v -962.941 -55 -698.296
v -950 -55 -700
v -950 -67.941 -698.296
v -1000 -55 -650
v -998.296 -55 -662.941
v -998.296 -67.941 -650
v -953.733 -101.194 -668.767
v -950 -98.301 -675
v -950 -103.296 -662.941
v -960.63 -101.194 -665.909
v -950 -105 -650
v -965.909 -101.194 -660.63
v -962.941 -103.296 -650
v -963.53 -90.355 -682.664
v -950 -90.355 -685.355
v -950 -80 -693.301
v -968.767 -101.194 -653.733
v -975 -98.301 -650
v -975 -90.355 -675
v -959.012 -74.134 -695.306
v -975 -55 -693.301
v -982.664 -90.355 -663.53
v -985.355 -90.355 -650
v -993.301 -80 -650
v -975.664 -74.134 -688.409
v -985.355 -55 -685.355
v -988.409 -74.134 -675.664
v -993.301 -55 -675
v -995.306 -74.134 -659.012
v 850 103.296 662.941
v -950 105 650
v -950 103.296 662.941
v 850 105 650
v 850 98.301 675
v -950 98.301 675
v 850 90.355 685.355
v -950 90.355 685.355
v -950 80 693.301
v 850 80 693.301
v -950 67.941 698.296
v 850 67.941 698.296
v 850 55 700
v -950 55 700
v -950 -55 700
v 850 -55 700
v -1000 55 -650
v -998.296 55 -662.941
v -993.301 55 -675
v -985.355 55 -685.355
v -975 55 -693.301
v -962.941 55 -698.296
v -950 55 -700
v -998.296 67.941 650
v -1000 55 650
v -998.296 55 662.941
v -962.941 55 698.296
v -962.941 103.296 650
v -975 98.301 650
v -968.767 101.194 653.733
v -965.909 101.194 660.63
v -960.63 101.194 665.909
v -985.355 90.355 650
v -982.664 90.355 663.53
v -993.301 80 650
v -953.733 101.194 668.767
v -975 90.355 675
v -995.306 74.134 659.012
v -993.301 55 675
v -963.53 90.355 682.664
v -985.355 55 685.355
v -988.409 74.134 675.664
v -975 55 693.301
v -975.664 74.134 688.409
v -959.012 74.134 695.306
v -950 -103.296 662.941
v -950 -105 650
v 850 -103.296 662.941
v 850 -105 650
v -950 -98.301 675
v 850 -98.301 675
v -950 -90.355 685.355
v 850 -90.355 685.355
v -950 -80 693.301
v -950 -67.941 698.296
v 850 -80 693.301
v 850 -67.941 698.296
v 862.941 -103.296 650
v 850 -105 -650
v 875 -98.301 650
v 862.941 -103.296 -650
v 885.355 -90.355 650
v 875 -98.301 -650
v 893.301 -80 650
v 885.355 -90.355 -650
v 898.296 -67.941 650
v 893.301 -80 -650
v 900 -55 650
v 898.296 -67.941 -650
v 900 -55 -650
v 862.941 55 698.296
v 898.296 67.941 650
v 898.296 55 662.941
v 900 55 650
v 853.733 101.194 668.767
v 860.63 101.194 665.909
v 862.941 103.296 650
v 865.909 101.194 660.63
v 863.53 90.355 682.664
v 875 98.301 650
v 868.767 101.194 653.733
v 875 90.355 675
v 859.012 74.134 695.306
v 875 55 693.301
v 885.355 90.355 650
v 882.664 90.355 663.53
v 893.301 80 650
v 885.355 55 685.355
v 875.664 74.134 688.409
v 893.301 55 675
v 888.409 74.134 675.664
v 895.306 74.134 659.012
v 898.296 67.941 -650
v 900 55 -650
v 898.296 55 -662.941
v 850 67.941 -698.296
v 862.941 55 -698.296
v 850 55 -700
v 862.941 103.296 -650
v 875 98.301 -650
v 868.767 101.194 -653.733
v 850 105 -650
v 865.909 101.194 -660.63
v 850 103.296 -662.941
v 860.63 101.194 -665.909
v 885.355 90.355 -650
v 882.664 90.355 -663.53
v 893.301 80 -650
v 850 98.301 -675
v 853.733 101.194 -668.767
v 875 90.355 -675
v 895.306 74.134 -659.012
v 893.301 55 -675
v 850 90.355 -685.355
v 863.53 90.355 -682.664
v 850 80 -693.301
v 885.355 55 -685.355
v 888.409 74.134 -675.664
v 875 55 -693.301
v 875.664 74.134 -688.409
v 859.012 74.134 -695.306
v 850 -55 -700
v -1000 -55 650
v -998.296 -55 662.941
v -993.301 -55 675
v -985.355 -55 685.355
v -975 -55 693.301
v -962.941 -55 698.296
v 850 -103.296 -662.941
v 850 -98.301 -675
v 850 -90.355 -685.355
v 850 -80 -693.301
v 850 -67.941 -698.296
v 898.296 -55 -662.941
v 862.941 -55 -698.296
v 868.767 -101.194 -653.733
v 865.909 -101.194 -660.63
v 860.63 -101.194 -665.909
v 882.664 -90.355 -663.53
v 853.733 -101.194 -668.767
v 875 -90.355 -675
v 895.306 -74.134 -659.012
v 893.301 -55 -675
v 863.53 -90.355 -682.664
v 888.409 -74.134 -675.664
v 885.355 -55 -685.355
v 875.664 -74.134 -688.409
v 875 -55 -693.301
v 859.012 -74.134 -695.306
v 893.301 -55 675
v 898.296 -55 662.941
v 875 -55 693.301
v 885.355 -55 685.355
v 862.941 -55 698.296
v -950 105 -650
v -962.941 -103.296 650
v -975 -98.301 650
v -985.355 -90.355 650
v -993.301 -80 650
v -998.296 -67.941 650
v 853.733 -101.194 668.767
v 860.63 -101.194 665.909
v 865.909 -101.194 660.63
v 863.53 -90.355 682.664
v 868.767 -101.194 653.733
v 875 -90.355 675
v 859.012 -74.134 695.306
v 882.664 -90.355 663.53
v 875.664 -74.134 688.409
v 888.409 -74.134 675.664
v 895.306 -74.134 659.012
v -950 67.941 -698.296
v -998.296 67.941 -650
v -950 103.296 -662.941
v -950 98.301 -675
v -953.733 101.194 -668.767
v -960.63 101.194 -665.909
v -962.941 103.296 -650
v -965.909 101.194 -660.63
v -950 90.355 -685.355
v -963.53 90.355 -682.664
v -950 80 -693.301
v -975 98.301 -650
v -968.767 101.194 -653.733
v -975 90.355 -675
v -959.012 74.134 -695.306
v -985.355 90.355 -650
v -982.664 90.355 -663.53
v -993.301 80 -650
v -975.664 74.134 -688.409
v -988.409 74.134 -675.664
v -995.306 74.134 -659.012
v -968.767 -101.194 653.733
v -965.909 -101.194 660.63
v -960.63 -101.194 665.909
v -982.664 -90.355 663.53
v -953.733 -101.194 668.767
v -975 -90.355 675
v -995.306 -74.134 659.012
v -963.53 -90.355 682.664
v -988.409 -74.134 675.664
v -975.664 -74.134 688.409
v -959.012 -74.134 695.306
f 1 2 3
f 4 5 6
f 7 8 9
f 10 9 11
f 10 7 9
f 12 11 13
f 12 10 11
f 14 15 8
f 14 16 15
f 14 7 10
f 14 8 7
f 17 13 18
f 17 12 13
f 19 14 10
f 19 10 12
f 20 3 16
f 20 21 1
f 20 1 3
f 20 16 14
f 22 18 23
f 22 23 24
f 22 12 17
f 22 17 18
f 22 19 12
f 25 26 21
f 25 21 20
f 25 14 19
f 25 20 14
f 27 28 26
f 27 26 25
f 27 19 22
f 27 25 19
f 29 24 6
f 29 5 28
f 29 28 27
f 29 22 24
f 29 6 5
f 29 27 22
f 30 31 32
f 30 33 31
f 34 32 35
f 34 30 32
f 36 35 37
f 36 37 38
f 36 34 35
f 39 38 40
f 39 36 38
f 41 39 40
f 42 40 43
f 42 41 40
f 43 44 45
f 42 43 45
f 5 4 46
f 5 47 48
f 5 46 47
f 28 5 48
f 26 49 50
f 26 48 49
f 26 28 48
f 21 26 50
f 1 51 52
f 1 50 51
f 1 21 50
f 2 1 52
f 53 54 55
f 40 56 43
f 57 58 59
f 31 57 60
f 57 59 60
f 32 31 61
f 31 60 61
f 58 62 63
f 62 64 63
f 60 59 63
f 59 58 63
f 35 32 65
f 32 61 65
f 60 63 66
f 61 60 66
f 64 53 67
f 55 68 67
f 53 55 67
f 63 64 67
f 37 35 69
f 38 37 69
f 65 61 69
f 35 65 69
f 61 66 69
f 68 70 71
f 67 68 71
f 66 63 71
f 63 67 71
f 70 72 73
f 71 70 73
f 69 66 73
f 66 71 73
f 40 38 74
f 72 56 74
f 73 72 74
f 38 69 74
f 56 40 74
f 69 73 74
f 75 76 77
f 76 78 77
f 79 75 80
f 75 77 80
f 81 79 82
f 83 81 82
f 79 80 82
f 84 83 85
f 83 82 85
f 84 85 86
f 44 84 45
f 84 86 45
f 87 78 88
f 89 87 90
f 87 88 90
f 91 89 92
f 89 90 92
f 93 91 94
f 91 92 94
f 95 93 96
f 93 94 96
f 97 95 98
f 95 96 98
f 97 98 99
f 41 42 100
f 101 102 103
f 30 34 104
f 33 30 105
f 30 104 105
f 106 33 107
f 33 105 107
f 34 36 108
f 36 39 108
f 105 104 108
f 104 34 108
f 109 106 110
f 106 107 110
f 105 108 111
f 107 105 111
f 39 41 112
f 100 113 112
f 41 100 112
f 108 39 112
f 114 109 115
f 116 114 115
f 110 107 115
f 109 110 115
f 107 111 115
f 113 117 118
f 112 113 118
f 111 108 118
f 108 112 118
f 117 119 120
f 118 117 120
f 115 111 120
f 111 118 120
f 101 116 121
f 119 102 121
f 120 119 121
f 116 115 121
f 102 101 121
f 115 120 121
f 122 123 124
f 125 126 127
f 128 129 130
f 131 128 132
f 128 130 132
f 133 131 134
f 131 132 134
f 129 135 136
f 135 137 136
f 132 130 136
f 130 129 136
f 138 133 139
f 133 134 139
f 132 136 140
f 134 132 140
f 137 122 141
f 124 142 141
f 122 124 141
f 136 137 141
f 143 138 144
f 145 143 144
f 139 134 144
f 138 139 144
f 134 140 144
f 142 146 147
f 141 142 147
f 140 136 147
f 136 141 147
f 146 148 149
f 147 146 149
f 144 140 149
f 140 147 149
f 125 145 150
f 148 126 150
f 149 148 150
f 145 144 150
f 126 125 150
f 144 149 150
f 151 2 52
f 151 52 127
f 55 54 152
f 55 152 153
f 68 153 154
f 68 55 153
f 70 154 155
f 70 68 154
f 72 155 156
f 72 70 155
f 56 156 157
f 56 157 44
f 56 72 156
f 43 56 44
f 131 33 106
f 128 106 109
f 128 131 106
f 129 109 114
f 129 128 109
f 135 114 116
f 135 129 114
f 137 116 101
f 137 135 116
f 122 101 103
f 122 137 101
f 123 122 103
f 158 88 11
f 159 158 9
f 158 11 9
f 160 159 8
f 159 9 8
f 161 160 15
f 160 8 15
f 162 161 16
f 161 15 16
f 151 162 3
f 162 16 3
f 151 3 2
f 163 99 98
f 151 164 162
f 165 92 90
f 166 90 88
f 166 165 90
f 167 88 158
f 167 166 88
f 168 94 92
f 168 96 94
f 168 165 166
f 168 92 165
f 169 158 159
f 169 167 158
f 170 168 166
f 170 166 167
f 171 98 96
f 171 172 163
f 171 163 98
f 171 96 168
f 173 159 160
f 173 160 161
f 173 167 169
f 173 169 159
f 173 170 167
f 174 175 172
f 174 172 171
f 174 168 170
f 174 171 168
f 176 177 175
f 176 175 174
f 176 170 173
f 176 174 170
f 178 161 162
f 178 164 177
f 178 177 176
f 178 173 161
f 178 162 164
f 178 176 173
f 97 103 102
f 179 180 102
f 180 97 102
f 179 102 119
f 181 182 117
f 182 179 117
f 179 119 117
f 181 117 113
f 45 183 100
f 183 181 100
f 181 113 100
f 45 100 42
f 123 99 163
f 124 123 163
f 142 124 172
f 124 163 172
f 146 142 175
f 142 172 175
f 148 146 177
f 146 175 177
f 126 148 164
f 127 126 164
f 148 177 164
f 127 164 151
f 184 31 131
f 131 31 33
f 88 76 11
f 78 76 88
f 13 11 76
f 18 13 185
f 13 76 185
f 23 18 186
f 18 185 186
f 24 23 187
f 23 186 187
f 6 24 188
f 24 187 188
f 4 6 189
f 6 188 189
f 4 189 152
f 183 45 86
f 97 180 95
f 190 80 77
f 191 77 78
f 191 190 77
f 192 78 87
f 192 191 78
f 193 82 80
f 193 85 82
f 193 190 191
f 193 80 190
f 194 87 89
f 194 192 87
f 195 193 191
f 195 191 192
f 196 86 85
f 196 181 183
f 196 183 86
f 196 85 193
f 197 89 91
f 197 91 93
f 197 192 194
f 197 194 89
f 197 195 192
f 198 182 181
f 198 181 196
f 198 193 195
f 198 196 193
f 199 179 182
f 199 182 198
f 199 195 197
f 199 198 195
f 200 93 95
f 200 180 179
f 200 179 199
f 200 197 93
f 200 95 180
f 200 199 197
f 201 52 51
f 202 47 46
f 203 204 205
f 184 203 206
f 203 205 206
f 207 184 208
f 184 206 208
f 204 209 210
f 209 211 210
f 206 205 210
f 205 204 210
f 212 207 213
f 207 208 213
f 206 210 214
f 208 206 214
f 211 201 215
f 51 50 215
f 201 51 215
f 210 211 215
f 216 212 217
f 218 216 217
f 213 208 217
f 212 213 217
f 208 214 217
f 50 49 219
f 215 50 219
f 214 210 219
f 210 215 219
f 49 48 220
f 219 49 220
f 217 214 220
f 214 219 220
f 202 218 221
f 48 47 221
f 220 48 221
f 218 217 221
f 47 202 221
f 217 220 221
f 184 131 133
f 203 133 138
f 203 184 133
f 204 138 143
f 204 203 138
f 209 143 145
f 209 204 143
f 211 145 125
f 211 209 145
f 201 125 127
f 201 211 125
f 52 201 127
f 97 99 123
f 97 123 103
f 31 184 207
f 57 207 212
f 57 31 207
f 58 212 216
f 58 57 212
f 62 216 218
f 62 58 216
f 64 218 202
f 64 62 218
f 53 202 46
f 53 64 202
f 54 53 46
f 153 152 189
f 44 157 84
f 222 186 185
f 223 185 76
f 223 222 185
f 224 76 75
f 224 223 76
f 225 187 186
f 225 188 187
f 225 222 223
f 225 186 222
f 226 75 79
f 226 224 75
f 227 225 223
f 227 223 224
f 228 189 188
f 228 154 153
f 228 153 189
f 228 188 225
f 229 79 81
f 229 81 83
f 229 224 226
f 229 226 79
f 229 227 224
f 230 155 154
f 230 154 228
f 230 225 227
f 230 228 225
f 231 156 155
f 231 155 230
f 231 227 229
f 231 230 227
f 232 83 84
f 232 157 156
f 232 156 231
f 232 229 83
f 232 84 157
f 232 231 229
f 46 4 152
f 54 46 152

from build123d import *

# Parameters (mm, degrees)
F0_W     = 1900
F0_H     = 1400
F1_DEPTH = 105
F2_R     = 50
F3_R     = 50


with BuildPart() as f1:
    # F0 (on Front) → F1 (new body, symmetric)
    with BuildSketch(Plane.XZ):
        with Locations((-50, 0)):
            Rectangle(F0_W, F0_H)
    extrude(amount=F1_DEPTH, both=True)

    # F2
    f2_edges = [f1.edges().sort_by_distance(p)[0] for p in [
        (-1000, 0, 700),
        (900, 0, 700),
        (900, 0, -700),
        (-1000, 0, -700),
    ]]
    fillet(f2_edges, radius=F2_R)

    # F3
    f3_edges = [f1.edges().sort_by_distance(p)[0] for p in [
        (-50, -105, 700),
        (885.355339, -105, 685.355339),
        (-985.355339, -105, 685.355339),
        (900, -105, 0),
        (-1000, -105, 0),
        (885.355339, -105, -685.355339),
        (-985.355339, -105, -685.355339),
        (-50, -105, -700),
        (-50, 105, 700),
        (885.355339, 105, 685.355339),
        (-985.355339, 105, 685.355339),
        (900, 105, 0),
        (-1000, 105, 0),
        (885.355339, 105, -685.355339),
        (-985.355339, 105, -685.355339),
        (-50, 105, -700),
    ]]
    fillet(f3_edges, radius=F3_R)


solid = f1.part
